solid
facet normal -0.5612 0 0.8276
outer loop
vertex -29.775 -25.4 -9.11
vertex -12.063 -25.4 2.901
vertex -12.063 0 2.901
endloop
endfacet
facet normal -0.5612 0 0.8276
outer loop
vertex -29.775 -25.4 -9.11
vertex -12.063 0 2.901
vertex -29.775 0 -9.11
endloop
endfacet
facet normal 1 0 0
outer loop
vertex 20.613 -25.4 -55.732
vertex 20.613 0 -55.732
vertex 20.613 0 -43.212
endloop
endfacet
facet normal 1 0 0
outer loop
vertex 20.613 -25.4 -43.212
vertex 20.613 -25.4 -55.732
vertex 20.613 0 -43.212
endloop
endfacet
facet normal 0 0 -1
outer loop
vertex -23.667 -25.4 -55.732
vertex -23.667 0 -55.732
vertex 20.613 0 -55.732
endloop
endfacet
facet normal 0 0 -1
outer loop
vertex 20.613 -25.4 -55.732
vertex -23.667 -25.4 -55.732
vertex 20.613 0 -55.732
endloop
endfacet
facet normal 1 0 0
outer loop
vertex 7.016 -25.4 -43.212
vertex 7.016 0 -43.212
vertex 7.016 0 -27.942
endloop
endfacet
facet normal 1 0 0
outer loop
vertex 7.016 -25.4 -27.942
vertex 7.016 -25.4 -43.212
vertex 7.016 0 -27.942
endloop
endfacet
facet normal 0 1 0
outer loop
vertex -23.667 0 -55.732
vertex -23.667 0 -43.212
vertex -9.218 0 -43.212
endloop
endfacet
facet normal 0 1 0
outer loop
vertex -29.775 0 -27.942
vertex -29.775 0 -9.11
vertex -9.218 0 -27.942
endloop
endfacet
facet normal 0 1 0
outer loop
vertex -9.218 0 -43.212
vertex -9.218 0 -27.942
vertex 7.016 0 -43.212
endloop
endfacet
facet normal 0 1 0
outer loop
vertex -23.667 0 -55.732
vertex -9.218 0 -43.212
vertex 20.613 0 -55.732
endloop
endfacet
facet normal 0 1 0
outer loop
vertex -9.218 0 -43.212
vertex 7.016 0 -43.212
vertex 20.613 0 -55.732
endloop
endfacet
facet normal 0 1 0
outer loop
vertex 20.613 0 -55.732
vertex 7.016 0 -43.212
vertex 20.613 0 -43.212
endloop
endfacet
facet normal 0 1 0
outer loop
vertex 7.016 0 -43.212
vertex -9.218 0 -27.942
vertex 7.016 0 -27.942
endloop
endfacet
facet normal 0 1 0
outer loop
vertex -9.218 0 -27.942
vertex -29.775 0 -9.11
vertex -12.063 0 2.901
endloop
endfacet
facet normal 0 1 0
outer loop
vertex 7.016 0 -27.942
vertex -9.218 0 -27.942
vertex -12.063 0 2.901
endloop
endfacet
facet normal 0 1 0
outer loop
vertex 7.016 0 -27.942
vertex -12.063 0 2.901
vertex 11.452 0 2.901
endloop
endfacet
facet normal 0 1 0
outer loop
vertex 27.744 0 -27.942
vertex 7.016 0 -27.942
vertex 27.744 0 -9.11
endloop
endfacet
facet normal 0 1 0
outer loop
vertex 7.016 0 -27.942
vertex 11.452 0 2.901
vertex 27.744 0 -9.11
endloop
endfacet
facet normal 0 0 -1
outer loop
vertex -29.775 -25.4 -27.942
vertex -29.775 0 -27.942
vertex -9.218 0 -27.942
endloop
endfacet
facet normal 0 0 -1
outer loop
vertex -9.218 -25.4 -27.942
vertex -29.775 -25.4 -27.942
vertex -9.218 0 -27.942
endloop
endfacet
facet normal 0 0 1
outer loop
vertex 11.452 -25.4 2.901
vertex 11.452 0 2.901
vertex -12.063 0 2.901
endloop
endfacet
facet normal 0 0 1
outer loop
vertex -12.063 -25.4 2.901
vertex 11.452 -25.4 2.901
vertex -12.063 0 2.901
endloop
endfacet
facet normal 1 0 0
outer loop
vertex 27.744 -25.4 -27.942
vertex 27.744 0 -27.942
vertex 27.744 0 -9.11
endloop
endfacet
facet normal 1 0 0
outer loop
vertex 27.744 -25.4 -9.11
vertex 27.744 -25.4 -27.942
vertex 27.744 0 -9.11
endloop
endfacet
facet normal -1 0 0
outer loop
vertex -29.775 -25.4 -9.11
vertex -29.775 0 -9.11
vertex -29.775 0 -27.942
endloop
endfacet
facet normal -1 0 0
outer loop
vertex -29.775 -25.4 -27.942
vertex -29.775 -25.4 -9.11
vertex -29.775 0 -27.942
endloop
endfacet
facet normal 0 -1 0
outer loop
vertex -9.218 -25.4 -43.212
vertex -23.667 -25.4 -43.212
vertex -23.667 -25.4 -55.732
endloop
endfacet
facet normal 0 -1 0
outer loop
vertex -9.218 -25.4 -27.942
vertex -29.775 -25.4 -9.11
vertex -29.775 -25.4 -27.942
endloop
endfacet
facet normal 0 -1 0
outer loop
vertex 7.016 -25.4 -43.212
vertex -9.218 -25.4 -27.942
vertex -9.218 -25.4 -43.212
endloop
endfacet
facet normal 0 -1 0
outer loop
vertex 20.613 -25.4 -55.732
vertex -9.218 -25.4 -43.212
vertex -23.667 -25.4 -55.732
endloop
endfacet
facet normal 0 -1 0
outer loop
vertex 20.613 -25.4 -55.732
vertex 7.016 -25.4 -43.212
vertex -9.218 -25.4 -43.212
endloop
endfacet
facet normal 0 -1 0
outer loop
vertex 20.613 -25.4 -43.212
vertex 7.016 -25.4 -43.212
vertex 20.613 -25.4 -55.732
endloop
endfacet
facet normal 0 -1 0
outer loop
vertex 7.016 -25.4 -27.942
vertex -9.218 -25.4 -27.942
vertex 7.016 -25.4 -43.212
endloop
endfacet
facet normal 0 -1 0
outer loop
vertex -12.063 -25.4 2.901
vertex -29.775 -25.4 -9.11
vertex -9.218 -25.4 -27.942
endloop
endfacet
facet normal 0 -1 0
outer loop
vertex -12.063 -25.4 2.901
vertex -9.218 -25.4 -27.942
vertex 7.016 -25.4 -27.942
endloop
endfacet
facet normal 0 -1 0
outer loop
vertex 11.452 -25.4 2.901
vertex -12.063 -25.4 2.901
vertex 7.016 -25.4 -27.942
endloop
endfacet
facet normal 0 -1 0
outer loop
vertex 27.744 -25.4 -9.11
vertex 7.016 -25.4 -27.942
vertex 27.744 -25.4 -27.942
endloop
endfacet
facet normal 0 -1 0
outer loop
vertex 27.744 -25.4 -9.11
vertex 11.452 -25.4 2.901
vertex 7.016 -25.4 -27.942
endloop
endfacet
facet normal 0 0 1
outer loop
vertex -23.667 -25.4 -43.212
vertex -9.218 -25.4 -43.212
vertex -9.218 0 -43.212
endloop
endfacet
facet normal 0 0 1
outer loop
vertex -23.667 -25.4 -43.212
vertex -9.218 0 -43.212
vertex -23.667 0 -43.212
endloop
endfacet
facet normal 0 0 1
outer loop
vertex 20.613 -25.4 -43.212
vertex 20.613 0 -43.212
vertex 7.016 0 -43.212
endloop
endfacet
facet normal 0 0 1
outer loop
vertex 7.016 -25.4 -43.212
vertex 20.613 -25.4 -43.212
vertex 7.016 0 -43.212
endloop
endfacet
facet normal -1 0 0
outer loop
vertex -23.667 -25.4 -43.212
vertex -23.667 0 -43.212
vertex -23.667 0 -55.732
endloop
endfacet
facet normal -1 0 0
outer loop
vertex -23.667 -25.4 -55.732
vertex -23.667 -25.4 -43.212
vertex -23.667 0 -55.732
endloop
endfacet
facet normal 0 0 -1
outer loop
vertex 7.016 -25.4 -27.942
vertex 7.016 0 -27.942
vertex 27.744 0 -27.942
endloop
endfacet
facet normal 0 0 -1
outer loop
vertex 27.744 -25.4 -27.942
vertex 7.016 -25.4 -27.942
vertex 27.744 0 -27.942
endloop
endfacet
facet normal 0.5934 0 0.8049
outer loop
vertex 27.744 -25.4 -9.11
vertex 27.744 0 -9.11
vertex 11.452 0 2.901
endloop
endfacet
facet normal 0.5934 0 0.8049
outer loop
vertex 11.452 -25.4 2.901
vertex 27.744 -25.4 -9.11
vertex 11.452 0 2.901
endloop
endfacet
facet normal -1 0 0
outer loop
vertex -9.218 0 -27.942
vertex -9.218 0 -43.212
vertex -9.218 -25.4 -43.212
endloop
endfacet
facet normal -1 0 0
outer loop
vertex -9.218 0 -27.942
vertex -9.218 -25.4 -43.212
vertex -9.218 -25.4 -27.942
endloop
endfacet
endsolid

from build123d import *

# Parameters (mm, degrees)
F0_W     = 16.2341720425
F0_H     = 15.2690820396
F1_DEPTH = 25.4
F2_DEPTH = 25.4


# Not quite as in the source:
# - a feature names something its author has since deleted; it is built from what else it names


with BuildPart() as f1:
    # F0 (on Front) → F1 (new body)
    with BuildSketch(Plane.XZ):
        Polygon((-9.2177884653, -27.9424227774), (7.0163835771, -27.9424227774), (27.7444086969, -27.9424227774), (27.7444086969, -9.1097736731), (11.4521000938, 2.9011261649), (-12.0625765994, 2.9011261649), (-29.7747123986, -9.1097736731), (-29.7747123986, -27.9424227774), align=None)
        with Locations((-1.1007024441, -35.5769637972)):
            Rectangle(F0_W, F0_H)
    extrude(amount=F1_DEPTH)

    # F0 (on Front) → F2 (join)
    with BuildSketch(Plane.XZ):
        Polygon((-23.6670821905, -55.7321608067), (20.6132540479, -55.7321608067), (20.6132540479, -43.211504817), (7.0163835771, -43.211504817), (-9.2177884653, -43.211504817), (-23.6670821905, -43.211504817), align=None)
    extrude(amount=F2_DEPTH)


solid = f1.part
